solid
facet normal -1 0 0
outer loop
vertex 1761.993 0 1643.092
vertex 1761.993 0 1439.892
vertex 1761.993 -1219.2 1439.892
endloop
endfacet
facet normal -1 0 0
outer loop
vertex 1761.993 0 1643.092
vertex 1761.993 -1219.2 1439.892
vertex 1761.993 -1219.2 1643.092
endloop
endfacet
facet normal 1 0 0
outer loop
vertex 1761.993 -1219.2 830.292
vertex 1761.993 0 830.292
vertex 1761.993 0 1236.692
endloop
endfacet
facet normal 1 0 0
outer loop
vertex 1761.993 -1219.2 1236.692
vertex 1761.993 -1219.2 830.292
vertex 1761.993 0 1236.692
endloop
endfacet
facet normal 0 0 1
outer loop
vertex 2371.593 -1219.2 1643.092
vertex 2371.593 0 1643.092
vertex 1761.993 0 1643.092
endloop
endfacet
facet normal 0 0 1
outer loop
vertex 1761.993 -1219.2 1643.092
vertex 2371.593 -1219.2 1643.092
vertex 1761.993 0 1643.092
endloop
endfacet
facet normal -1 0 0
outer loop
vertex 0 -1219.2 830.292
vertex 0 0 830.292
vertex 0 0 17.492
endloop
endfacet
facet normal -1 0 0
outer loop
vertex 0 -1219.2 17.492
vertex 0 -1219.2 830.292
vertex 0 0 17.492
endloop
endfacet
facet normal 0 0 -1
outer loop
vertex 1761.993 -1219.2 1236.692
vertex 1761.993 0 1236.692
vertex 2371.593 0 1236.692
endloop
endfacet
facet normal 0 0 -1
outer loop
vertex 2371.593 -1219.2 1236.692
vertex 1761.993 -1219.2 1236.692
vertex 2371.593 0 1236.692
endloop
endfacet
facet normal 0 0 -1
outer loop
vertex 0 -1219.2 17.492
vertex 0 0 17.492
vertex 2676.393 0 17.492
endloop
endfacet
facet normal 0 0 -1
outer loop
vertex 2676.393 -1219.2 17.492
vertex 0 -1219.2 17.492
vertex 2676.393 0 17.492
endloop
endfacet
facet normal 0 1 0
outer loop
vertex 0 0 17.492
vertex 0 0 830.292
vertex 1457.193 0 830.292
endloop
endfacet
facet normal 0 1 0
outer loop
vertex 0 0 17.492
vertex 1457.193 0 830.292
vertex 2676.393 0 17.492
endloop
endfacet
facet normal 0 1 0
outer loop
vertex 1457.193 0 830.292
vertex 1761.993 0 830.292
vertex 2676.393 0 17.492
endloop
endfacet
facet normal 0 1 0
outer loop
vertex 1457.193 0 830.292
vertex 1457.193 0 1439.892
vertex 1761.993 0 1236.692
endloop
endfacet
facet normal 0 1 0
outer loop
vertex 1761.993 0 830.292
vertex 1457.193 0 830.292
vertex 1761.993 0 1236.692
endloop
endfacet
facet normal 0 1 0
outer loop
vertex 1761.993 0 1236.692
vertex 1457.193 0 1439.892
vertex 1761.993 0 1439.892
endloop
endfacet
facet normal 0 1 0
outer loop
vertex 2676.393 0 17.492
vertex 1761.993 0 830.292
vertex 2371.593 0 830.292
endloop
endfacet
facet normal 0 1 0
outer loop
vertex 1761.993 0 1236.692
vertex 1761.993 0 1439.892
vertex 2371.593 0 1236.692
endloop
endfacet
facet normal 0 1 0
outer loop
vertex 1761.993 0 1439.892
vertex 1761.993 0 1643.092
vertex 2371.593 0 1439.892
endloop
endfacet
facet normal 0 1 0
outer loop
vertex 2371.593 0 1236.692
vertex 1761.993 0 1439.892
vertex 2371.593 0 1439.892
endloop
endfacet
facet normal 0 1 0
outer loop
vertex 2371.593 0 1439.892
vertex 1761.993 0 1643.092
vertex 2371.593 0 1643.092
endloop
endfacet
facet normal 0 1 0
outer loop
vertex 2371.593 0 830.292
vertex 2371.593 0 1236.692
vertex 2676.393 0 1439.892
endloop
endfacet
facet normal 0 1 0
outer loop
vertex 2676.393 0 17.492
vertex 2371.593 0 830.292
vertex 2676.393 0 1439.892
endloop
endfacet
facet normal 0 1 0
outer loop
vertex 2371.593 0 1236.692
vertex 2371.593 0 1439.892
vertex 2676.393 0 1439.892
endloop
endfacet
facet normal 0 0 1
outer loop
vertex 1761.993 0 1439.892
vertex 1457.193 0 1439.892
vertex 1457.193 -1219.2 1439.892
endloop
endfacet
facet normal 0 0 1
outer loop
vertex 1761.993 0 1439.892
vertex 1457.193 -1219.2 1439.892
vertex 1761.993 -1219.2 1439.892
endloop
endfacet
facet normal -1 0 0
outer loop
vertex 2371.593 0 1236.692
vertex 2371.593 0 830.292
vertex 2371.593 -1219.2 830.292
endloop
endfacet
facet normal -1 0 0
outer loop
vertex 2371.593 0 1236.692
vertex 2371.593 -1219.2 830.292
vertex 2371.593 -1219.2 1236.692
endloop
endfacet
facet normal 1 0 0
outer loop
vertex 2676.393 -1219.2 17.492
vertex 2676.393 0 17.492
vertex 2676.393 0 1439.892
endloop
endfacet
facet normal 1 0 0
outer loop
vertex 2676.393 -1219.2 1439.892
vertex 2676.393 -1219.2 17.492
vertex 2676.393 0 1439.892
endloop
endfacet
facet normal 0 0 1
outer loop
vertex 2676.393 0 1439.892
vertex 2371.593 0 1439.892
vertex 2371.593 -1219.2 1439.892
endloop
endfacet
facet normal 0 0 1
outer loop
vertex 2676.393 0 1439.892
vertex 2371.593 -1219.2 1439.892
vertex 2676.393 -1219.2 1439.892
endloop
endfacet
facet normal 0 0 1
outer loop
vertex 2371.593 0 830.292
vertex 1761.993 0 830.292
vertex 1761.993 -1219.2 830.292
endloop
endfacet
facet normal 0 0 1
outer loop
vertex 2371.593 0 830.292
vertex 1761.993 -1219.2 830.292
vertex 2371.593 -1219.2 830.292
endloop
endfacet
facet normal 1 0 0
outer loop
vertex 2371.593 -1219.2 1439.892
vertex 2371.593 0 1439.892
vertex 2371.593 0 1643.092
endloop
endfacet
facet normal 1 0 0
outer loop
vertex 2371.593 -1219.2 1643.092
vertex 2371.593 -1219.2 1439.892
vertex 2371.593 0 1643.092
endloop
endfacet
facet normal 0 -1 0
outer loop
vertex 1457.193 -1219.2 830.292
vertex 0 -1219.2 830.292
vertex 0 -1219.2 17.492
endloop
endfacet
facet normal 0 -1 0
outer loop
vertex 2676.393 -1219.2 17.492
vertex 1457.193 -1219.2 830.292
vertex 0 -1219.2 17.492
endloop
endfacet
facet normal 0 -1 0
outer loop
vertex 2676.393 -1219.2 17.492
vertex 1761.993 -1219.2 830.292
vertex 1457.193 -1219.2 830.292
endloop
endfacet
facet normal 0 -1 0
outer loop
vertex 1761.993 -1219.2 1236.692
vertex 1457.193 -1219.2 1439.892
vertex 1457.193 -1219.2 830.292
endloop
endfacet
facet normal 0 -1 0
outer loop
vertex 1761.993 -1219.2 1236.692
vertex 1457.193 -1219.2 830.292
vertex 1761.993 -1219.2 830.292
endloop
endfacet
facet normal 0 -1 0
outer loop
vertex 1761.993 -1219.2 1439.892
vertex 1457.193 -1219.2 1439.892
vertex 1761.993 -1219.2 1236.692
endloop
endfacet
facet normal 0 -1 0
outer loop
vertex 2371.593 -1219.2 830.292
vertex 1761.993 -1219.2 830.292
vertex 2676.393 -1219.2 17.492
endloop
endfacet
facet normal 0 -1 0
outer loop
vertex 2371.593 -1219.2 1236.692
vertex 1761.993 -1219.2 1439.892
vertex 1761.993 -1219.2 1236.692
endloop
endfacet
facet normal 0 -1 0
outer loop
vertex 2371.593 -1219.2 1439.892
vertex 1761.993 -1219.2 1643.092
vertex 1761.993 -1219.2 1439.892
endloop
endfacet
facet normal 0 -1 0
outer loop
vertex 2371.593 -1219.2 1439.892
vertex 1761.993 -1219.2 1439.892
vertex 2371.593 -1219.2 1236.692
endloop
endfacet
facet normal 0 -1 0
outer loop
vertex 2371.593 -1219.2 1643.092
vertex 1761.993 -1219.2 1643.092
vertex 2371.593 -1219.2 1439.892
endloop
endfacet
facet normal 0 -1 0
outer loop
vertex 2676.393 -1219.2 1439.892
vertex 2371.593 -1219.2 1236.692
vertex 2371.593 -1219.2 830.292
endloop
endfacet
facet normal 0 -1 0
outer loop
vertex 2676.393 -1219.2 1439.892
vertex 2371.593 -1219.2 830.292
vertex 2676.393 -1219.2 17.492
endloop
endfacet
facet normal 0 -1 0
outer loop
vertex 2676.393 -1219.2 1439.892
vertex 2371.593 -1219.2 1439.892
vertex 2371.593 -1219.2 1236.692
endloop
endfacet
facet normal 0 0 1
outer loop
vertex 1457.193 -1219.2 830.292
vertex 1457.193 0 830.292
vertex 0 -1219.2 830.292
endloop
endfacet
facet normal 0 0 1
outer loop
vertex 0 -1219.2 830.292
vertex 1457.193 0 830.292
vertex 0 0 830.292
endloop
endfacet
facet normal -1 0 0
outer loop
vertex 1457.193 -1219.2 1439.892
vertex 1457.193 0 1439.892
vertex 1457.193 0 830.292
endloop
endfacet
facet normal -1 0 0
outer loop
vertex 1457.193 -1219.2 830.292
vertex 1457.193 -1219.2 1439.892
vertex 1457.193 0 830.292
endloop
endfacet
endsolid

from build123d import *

# Parameters (mm, degrees)
F1_DEPTH = 1219.2
F2_W     = 304.8
F2_H     = 203.2
F3_DEPTH = 1219.2
F4_W     = 304.8
F4_H     = 203.2
F5_DEPTH = 1219.201
F7_W     = 609.6
F7_H     = 406.4
F8_DEPTH = 1219.201


with BuildPart() as f1:
    # F0 (on Front) → F1 (new body)
    with BuildSketch(Plane.XZ):
        Polygon((0, 830.291607), (0, 17.491607), (2676.393341, 17.491607), (2676.393341, 1643.091607), (1457.193341, 1643.091607), (1457.193341, 830.291607), align=None)
    extrude(amount=F1_DEPTH)

    # F2 (on face) → F3 (cut, through all)
    with BuildSketch(Plane.XZ.offset(1219.2)):
        with Locations((1609.593341, 1541.491607)):
            Rectangle(F2_W, F2_H)
    extrude(amount=-F3_DEPTH, mode=Mode.SUBTRACT)

    # F4 (on face) → F5 (cut, through all)
    with BuildSketch(Plane.XZ.offset(1219.2)):
        with Locations((2523.993341, 1541.491607)):
            Rectangle(F4_W, F4_H)
    extrude(amount=-F5_DEPTH, mode=Mode.SUBTRACT)

    # F7 (on face) → F8 (cut, through all)
    with BuildSketch(Plane.XZ.offset(1219.2)):
        with Locations((2066.793341, 1033.491607)):
            Rectangle(F7_W, F7_H)
    extrude(amount=-F8_DEPTH, mode=Mode.SUBTRACT)


solid = f1.part
